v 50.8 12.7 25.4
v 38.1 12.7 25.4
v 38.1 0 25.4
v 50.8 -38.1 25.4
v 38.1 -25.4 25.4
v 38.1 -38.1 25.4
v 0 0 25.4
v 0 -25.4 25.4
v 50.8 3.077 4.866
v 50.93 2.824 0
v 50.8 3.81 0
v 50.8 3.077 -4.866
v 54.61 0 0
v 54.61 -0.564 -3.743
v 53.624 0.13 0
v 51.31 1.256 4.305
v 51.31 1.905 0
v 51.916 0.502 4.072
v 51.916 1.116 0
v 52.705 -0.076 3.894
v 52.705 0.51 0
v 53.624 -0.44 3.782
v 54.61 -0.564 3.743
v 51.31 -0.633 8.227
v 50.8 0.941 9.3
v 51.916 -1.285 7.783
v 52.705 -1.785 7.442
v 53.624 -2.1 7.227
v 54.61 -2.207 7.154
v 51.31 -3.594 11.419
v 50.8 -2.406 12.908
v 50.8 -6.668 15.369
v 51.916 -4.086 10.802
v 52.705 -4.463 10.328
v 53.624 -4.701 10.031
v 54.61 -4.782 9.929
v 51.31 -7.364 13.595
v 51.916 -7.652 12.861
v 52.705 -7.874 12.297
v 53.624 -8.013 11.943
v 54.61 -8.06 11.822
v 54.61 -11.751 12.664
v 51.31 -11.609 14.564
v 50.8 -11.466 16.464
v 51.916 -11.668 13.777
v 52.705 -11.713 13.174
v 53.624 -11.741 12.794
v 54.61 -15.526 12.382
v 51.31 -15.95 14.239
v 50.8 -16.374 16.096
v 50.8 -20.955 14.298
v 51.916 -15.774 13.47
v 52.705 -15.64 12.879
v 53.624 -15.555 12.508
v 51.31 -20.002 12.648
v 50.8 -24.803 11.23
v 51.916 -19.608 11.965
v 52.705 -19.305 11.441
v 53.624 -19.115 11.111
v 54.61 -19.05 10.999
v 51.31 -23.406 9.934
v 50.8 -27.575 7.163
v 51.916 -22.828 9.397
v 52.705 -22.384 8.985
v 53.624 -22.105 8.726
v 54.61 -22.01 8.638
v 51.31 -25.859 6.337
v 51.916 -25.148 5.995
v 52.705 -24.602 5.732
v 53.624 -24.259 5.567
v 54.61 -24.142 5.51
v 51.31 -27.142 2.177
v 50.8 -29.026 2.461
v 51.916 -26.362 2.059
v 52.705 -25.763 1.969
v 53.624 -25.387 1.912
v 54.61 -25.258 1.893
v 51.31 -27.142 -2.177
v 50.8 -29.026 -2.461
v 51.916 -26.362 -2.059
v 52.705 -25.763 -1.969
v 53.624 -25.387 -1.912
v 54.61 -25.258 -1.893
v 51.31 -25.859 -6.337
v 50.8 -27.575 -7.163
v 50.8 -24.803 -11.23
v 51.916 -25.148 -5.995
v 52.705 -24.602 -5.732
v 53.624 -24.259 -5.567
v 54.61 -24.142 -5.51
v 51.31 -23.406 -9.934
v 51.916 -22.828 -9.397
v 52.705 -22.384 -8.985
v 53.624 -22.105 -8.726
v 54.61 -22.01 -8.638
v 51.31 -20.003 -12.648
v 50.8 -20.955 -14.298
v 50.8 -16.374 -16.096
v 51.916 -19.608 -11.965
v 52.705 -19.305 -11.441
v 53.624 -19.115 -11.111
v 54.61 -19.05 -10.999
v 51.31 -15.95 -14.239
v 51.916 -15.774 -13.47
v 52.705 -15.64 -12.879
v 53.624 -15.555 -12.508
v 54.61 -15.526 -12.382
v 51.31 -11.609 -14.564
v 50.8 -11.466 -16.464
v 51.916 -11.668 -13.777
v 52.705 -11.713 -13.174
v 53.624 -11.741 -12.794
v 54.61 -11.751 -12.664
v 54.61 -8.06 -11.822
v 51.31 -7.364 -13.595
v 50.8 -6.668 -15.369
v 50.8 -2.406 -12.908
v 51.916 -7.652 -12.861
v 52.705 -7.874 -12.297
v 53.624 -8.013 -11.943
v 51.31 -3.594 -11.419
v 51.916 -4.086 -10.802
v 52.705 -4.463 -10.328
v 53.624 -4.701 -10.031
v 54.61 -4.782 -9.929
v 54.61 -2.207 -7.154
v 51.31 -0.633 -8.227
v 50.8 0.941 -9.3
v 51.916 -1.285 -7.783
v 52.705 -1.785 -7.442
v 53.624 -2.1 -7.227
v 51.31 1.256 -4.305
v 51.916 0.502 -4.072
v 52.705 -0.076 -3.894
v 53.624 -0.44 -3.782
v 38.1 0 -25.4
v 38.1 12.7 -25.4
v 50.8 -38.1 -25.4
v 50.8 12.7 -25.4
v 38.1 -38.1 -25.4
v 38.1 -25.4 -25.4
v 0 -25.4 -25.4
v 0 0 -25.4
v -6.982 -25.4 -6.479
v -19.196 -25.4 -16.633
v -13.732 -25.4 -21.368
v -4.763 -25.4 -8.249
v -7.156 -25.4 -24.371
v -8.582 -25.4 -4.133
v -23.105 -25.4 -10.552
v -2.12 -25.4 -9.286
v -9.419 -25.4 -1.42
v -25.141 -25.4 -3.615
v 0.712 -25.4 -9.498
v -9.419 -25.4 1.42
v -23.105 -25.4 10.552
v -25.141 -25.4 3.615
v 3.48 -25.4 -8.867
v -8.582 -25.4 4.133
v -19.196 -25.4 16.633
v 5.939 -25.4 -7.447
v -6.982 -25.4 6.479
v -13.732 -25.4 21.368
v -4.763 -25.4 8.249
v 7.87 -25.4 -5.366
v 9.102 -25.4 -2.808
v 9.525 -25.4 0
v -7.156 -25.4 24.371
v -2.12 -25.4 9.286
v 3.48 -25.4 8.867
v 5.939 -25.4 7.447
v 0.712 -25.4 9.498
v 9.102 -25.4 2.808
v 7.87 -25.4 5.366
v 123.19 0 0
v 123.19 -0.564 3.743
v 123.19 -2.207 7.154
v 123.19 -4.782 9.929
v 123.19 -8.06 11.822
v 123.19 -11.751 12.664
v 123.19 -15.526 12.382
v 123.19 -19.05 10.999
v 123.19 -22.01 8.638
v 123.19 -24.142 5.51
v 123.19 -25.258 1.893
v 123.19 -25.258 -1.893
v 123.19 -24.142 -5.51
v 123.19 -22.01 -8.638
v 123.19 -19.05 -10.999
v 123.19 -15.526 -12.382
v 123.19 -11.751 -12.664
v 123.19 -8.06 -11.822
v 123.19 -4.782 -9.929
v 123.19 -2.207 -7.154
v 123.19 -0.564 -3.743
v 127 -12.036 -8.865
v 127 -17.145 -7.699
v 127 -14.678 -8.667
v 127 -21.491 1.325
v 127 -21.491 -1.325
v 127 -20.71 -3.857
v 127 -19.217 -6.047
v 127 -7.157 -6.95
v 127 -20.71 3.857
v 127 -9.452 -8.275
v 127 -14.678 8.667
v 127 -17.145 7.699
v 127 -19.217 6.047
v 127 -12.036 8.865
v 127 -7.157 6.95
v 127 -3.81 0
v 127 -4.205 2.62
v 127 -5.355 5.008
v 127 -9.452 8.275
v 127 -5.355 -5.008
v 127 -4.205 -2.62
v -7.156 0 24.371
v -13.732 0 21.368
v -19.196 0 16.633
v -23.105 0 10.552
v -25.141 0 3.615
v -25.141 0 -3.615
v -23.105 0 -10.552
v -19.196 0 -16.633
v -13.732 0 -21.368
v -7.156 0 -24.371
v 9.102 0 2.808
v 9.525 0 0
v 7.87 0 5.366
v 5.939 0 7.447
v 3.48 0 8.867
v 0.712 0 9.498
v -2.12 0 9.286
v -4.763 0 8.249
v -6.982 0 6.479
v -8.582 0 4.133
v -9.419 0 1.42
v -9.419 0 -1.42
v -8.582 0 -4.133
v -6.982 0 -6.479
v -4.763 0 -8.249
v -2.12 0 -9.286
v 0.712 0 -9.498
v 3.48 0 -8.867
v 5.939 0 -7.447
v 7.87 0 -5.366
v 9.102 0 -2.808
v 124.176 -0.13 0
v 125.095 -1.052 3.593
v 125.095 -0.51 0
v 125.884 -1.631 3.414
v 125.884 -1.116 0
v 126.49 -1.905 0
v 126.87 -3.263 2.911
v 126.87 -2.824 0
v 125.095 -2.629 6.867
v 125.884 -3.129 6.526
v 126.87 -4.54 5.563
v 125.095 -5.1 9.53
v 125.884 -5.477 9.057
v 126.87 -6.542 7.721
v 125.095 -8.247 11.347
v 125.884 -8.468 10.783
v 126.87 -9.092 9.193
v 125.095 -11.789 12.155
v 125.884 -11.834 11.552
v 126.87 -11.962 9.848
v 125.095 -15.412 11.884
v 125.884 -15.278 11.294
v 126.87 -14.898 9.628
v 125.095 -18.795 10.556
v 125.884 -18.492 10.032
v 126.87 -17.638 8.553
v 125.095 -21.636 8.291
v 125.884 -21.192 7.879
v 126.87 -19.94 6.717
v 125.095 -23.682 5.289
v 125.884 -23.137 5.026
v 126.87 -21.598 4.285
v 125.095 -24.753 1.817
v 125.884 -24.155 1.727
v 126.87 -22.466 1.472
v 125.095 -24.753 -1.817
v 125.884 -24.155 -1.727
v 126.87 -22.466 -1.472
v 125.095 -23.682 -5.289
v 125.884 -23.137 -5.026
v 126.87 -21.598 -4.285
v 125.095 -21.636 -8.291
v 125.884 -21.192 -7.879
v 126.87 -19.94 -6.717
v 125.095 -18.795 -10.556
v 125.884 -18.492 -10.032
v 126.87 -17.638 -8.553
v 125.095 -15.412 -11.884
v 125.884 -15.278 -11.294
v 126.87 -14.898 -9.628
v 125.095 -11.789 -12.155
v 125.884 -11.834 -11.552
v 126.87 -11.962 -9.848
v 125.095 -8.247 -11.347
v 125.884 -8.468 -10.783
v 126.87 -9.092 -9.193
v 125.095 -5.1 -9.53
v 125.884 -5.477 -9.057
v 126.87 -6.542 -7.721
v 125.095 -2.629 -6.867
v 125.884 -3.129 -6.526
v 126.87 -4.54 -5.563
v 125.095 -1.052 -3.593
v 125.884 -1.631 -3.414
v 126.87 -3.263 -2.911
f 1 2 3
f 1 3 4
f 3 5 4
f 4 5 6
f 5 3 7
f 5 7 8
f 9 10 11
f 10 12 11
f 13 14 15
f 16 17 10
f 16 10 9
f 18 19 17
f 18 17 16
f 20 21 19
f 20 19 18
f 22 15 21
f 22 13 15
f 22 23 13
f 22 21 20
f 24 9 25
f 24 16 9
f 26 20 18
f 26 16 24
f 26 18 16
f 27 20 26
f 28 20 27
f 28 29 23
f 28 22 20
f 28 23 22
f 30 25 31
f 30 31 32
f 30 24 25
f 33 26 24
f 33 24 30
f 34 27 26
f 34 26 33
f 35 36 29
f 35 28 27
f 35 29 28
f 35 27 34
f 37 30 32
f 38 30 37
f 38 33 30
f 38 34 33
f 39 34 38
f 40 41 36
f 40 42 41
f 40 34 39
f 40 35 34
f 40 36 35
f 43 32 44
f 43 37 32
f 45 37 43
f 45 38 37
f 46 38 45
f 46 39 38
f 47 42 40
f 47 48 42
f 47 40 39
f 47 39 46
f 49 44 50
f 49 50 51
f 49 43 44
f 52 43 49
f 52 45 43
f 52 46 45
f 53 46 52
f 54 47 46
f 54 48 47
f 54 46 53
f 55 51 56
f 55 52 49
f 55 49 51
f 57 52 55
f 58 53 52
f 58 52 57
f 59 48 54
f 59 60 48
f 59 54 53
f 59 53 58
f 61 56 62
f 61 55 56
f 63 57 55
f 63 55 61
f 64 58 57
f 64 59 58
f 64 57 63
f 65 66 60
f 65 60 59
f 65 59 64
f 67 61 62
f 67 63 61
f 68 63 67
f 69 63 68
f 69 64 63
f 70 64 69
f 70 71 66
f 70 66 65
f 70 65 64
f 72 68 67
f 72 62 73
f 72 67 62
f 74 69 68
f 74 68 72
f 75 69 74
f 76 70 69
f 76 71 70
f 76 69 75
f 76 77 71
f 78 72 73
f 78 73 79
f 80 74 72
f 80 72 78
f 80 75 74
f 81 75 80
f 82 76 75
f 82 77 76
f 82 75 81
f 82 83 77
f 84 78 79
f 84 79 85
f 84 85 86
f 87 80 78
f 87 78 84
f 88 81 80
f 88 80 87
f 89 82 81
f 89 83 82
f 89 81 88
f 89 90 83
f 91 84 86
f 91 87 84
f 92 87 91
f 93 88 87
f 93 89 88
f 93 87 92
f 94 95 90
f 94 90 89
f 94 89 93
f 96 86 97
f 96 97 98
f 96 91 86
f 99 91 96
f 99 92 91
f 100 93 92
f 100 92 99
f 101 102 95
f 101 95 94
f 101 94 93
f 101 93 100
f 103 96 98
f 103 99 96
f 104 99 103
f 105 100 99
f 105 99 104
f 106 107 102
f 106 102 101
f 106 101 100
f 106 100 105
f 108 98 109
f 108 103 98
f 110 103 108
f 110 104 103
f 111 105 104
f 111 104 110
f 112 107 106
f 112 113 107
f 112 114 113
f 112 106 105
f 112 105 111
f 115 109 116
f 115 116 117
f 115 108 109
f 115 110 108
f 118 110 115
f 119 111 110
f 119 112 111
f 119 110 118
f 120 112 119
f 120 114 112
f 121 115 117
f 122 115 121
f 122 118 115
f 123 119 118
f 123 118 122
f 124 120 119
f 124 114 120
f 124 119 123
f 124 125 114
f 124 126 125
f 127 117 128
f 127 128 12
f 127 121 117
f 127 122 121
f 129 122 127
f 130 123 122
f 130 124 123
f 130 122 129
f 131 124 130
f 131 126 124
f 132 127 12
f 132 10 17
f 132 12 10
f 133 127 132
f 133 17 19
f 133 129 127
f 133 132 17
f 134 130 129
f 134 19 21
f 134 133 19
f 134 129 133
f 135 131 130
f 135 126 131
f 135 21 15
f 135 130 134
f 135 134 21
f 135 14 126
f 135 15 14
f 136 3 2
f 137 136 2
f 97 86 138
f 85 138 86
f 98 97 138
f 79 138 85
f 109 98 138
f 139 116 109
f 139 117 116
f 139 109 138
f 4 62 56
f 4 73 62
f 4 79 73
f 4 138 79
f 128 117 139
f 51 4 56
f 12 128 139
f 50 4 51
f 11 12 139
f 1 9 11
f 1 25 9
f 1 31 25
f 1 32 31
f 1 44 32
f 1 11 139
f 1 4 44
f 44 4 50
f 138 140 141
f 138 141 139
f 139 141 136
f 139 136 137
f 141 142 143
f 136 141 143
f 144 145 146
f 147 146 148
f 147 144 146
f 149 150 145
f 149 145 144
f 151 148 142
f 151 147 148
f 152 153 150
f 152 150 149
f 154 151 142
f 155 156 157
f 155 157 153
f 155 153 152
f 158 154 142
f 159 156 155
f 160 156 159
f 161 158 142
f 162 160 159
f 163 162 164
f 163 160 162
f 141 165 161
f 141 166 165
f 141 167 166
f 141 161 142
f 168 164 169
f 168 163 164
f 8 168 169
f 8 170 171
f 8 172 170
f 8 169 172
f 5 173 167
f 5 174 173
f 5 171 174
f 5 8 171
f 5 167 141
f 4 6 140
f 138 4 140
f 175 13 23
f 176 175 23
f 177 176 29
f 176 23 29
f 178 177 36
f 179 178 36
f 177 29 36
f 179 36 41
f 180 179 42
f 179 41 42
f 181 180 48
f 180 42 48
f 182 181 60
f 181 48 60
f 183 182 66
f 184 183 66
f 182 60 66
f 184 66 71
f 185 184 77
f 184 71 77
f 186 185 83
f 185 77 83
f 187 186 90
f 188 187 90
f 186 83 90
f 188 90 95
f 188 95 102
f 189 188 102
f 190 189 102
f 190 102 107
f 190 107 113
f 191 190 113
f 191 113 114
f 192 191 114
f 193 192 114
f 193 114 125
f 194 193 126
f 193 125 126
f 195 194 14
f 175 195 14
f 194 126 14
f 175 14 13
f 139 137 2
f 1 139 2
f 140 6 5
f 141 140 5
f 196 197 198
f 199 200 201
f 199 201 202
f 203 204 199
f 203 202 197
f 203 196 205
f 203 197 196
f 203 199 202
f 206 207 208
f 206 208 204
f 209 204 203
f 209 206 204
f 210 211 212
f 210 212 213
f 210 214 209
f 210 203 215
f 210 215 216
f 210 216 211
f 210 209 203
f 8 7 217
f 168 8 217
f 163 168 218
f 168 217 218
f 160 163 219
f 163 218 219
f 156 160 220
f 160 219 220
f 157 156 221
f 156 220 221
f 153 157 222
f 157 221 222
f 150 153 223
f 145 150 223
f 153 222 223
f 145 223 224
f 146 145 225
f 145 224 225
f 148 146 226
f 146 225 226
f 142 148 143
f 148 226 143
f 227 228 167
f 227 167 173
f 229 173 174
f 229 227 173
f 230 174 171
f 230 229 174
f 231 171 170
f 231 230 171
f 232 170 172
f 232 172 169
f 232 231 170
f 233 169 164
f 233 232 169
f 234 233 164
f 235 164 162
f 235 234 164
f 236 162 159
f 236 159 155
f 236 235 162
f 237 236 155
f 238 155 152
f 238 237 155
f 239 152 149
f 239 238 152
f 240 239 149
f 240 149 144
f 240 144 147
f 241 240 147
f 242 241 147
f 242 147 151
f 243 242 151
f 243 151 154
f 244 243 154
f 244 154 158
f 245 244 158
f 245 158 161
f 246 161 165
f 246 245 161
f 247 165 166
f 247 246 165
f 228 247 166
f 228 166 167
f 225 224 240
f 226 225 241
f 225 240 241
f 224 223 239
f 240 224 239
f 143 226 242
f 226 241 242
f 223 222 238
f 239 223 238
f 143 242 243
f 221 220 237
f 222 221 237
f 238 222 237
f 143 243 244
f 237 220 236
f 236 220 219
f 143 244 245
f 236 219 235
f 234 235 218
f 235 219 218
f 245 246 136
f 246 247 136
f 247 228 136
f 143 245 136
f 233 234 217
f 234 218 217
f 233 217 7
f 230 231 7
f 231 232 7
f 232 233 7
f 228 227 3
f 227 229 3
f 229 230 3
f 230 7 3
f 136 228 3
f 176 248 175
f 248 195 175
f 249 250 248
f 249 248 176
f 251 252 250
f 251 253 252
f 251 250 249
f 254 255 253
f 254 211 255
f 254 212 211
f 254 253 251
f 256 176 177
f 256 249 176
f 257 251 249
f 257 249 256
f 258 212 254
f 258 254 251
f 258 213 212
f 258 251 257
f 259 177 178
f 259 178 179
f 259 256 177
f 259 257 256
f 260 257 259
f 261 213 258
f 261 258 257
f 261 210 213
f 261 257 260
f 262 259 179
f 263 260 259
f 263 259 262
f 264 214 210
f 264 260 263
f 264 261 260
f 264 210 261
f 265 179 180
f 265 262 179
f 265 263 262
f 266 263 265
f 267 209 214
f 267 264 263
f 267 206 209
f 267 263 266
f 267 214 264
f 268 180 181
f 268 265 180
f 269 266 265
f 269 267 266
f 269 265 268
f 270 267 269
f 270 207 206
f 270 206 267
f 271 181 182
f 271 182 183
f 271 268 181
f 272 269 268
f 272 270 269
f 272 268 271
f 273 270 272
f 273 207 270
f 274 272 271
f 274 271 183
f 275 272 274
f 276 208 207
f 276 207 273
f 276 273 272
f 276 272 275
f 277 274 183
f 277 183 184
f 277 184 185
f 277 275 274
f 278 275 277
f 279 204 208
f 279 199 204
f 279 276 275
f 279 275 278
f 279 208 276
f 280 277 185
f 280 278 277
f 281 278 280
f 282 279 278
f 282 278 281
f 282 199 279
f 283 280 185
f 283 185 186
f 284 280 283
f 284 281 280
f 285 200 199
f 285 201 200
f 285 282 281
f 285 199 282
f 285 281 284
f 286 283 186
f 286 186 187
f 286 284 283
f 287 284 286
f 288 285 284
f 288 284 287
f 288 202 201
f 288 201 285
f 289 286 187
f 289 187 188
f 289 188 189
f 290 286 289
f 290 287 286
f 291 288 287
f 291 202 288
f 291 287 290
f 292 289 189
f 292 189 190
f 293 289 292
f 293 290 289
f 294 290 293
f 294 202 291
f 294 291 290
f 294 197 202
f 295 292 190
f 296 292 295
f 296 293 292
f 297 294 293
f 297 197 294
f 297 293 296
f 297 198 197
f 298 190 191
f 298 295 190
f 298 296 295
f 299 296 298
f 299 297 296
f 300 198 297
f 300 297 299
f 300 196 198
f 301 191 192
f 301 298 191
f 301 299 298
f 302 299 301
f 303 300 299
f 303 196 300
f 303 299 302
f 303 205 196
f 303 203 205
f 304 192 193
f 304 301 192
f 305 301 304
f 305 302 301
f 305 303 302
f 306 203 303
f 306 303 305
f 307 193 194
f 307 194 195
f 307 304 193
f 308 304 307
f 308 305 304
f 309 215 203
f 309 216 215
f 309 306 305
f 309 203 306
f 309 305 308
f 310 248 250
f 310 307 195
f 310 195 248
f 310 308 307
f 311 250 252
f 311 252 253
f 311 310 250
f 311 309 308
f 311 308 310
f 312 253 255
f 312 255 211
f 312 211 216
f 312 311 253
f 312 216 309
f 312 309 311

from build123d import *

# Parameters (mm, degrees)
F0_R     = 9.525
F1_DEPTH = 25.4
F3_DEPTH = 12.7
F4_R     = 12.7
F5_DEPTH = 76.2
F6_R     = 3.81


with BuildPart() as f1:
    # F0 (on Front) → F1 (new body)
    with BuildSketch(Plane.XZ):
        with BuildLine():
            Line((38.1, 25.4), (0, 25.4))
            ThreePointArc((0, 25.4), (-25.4, 0), (0, -25.4))
            Line((0, -25.4), (38.1, -25.4))
            Line((38.1, -25.4), (38.1, 25.4))
        make_face()
        Circle(F0_R, mode=Mode.SUBTRACT)
    extrude(amount=F1_DEPTH)

    # F2 (on face) → F3 (join)
    with BuildSketch(Plane.YZ.offset(38.1)):
        Polygon((12.7, 25.4), (0, 25.4), (-25.4, 25.4), (-38.1, 25.4), (-38.1, -25.4), (-25.4, -25.4), (0, -25.4), (12.7, -25.4), align=None)
    extrude(amount=F3_DEPTH)

    # F4 (on face) → F5 (join)
    with BuildSketch(Plane.YZ.offset(50.8)):
        with Locations((-12.7, 0)):
            Circle(F4_R)
    extrude(amount=F5_DEPTH)

    # F6
    f6_edges = [f1.edges().sort_by_distance(p)[0] for p in [
        (127, -25.4, 0),
        (50.8, -25.4, 0),
    ]]
    fillet(f6_edges, radius=F6_R)


solid = f1.part
